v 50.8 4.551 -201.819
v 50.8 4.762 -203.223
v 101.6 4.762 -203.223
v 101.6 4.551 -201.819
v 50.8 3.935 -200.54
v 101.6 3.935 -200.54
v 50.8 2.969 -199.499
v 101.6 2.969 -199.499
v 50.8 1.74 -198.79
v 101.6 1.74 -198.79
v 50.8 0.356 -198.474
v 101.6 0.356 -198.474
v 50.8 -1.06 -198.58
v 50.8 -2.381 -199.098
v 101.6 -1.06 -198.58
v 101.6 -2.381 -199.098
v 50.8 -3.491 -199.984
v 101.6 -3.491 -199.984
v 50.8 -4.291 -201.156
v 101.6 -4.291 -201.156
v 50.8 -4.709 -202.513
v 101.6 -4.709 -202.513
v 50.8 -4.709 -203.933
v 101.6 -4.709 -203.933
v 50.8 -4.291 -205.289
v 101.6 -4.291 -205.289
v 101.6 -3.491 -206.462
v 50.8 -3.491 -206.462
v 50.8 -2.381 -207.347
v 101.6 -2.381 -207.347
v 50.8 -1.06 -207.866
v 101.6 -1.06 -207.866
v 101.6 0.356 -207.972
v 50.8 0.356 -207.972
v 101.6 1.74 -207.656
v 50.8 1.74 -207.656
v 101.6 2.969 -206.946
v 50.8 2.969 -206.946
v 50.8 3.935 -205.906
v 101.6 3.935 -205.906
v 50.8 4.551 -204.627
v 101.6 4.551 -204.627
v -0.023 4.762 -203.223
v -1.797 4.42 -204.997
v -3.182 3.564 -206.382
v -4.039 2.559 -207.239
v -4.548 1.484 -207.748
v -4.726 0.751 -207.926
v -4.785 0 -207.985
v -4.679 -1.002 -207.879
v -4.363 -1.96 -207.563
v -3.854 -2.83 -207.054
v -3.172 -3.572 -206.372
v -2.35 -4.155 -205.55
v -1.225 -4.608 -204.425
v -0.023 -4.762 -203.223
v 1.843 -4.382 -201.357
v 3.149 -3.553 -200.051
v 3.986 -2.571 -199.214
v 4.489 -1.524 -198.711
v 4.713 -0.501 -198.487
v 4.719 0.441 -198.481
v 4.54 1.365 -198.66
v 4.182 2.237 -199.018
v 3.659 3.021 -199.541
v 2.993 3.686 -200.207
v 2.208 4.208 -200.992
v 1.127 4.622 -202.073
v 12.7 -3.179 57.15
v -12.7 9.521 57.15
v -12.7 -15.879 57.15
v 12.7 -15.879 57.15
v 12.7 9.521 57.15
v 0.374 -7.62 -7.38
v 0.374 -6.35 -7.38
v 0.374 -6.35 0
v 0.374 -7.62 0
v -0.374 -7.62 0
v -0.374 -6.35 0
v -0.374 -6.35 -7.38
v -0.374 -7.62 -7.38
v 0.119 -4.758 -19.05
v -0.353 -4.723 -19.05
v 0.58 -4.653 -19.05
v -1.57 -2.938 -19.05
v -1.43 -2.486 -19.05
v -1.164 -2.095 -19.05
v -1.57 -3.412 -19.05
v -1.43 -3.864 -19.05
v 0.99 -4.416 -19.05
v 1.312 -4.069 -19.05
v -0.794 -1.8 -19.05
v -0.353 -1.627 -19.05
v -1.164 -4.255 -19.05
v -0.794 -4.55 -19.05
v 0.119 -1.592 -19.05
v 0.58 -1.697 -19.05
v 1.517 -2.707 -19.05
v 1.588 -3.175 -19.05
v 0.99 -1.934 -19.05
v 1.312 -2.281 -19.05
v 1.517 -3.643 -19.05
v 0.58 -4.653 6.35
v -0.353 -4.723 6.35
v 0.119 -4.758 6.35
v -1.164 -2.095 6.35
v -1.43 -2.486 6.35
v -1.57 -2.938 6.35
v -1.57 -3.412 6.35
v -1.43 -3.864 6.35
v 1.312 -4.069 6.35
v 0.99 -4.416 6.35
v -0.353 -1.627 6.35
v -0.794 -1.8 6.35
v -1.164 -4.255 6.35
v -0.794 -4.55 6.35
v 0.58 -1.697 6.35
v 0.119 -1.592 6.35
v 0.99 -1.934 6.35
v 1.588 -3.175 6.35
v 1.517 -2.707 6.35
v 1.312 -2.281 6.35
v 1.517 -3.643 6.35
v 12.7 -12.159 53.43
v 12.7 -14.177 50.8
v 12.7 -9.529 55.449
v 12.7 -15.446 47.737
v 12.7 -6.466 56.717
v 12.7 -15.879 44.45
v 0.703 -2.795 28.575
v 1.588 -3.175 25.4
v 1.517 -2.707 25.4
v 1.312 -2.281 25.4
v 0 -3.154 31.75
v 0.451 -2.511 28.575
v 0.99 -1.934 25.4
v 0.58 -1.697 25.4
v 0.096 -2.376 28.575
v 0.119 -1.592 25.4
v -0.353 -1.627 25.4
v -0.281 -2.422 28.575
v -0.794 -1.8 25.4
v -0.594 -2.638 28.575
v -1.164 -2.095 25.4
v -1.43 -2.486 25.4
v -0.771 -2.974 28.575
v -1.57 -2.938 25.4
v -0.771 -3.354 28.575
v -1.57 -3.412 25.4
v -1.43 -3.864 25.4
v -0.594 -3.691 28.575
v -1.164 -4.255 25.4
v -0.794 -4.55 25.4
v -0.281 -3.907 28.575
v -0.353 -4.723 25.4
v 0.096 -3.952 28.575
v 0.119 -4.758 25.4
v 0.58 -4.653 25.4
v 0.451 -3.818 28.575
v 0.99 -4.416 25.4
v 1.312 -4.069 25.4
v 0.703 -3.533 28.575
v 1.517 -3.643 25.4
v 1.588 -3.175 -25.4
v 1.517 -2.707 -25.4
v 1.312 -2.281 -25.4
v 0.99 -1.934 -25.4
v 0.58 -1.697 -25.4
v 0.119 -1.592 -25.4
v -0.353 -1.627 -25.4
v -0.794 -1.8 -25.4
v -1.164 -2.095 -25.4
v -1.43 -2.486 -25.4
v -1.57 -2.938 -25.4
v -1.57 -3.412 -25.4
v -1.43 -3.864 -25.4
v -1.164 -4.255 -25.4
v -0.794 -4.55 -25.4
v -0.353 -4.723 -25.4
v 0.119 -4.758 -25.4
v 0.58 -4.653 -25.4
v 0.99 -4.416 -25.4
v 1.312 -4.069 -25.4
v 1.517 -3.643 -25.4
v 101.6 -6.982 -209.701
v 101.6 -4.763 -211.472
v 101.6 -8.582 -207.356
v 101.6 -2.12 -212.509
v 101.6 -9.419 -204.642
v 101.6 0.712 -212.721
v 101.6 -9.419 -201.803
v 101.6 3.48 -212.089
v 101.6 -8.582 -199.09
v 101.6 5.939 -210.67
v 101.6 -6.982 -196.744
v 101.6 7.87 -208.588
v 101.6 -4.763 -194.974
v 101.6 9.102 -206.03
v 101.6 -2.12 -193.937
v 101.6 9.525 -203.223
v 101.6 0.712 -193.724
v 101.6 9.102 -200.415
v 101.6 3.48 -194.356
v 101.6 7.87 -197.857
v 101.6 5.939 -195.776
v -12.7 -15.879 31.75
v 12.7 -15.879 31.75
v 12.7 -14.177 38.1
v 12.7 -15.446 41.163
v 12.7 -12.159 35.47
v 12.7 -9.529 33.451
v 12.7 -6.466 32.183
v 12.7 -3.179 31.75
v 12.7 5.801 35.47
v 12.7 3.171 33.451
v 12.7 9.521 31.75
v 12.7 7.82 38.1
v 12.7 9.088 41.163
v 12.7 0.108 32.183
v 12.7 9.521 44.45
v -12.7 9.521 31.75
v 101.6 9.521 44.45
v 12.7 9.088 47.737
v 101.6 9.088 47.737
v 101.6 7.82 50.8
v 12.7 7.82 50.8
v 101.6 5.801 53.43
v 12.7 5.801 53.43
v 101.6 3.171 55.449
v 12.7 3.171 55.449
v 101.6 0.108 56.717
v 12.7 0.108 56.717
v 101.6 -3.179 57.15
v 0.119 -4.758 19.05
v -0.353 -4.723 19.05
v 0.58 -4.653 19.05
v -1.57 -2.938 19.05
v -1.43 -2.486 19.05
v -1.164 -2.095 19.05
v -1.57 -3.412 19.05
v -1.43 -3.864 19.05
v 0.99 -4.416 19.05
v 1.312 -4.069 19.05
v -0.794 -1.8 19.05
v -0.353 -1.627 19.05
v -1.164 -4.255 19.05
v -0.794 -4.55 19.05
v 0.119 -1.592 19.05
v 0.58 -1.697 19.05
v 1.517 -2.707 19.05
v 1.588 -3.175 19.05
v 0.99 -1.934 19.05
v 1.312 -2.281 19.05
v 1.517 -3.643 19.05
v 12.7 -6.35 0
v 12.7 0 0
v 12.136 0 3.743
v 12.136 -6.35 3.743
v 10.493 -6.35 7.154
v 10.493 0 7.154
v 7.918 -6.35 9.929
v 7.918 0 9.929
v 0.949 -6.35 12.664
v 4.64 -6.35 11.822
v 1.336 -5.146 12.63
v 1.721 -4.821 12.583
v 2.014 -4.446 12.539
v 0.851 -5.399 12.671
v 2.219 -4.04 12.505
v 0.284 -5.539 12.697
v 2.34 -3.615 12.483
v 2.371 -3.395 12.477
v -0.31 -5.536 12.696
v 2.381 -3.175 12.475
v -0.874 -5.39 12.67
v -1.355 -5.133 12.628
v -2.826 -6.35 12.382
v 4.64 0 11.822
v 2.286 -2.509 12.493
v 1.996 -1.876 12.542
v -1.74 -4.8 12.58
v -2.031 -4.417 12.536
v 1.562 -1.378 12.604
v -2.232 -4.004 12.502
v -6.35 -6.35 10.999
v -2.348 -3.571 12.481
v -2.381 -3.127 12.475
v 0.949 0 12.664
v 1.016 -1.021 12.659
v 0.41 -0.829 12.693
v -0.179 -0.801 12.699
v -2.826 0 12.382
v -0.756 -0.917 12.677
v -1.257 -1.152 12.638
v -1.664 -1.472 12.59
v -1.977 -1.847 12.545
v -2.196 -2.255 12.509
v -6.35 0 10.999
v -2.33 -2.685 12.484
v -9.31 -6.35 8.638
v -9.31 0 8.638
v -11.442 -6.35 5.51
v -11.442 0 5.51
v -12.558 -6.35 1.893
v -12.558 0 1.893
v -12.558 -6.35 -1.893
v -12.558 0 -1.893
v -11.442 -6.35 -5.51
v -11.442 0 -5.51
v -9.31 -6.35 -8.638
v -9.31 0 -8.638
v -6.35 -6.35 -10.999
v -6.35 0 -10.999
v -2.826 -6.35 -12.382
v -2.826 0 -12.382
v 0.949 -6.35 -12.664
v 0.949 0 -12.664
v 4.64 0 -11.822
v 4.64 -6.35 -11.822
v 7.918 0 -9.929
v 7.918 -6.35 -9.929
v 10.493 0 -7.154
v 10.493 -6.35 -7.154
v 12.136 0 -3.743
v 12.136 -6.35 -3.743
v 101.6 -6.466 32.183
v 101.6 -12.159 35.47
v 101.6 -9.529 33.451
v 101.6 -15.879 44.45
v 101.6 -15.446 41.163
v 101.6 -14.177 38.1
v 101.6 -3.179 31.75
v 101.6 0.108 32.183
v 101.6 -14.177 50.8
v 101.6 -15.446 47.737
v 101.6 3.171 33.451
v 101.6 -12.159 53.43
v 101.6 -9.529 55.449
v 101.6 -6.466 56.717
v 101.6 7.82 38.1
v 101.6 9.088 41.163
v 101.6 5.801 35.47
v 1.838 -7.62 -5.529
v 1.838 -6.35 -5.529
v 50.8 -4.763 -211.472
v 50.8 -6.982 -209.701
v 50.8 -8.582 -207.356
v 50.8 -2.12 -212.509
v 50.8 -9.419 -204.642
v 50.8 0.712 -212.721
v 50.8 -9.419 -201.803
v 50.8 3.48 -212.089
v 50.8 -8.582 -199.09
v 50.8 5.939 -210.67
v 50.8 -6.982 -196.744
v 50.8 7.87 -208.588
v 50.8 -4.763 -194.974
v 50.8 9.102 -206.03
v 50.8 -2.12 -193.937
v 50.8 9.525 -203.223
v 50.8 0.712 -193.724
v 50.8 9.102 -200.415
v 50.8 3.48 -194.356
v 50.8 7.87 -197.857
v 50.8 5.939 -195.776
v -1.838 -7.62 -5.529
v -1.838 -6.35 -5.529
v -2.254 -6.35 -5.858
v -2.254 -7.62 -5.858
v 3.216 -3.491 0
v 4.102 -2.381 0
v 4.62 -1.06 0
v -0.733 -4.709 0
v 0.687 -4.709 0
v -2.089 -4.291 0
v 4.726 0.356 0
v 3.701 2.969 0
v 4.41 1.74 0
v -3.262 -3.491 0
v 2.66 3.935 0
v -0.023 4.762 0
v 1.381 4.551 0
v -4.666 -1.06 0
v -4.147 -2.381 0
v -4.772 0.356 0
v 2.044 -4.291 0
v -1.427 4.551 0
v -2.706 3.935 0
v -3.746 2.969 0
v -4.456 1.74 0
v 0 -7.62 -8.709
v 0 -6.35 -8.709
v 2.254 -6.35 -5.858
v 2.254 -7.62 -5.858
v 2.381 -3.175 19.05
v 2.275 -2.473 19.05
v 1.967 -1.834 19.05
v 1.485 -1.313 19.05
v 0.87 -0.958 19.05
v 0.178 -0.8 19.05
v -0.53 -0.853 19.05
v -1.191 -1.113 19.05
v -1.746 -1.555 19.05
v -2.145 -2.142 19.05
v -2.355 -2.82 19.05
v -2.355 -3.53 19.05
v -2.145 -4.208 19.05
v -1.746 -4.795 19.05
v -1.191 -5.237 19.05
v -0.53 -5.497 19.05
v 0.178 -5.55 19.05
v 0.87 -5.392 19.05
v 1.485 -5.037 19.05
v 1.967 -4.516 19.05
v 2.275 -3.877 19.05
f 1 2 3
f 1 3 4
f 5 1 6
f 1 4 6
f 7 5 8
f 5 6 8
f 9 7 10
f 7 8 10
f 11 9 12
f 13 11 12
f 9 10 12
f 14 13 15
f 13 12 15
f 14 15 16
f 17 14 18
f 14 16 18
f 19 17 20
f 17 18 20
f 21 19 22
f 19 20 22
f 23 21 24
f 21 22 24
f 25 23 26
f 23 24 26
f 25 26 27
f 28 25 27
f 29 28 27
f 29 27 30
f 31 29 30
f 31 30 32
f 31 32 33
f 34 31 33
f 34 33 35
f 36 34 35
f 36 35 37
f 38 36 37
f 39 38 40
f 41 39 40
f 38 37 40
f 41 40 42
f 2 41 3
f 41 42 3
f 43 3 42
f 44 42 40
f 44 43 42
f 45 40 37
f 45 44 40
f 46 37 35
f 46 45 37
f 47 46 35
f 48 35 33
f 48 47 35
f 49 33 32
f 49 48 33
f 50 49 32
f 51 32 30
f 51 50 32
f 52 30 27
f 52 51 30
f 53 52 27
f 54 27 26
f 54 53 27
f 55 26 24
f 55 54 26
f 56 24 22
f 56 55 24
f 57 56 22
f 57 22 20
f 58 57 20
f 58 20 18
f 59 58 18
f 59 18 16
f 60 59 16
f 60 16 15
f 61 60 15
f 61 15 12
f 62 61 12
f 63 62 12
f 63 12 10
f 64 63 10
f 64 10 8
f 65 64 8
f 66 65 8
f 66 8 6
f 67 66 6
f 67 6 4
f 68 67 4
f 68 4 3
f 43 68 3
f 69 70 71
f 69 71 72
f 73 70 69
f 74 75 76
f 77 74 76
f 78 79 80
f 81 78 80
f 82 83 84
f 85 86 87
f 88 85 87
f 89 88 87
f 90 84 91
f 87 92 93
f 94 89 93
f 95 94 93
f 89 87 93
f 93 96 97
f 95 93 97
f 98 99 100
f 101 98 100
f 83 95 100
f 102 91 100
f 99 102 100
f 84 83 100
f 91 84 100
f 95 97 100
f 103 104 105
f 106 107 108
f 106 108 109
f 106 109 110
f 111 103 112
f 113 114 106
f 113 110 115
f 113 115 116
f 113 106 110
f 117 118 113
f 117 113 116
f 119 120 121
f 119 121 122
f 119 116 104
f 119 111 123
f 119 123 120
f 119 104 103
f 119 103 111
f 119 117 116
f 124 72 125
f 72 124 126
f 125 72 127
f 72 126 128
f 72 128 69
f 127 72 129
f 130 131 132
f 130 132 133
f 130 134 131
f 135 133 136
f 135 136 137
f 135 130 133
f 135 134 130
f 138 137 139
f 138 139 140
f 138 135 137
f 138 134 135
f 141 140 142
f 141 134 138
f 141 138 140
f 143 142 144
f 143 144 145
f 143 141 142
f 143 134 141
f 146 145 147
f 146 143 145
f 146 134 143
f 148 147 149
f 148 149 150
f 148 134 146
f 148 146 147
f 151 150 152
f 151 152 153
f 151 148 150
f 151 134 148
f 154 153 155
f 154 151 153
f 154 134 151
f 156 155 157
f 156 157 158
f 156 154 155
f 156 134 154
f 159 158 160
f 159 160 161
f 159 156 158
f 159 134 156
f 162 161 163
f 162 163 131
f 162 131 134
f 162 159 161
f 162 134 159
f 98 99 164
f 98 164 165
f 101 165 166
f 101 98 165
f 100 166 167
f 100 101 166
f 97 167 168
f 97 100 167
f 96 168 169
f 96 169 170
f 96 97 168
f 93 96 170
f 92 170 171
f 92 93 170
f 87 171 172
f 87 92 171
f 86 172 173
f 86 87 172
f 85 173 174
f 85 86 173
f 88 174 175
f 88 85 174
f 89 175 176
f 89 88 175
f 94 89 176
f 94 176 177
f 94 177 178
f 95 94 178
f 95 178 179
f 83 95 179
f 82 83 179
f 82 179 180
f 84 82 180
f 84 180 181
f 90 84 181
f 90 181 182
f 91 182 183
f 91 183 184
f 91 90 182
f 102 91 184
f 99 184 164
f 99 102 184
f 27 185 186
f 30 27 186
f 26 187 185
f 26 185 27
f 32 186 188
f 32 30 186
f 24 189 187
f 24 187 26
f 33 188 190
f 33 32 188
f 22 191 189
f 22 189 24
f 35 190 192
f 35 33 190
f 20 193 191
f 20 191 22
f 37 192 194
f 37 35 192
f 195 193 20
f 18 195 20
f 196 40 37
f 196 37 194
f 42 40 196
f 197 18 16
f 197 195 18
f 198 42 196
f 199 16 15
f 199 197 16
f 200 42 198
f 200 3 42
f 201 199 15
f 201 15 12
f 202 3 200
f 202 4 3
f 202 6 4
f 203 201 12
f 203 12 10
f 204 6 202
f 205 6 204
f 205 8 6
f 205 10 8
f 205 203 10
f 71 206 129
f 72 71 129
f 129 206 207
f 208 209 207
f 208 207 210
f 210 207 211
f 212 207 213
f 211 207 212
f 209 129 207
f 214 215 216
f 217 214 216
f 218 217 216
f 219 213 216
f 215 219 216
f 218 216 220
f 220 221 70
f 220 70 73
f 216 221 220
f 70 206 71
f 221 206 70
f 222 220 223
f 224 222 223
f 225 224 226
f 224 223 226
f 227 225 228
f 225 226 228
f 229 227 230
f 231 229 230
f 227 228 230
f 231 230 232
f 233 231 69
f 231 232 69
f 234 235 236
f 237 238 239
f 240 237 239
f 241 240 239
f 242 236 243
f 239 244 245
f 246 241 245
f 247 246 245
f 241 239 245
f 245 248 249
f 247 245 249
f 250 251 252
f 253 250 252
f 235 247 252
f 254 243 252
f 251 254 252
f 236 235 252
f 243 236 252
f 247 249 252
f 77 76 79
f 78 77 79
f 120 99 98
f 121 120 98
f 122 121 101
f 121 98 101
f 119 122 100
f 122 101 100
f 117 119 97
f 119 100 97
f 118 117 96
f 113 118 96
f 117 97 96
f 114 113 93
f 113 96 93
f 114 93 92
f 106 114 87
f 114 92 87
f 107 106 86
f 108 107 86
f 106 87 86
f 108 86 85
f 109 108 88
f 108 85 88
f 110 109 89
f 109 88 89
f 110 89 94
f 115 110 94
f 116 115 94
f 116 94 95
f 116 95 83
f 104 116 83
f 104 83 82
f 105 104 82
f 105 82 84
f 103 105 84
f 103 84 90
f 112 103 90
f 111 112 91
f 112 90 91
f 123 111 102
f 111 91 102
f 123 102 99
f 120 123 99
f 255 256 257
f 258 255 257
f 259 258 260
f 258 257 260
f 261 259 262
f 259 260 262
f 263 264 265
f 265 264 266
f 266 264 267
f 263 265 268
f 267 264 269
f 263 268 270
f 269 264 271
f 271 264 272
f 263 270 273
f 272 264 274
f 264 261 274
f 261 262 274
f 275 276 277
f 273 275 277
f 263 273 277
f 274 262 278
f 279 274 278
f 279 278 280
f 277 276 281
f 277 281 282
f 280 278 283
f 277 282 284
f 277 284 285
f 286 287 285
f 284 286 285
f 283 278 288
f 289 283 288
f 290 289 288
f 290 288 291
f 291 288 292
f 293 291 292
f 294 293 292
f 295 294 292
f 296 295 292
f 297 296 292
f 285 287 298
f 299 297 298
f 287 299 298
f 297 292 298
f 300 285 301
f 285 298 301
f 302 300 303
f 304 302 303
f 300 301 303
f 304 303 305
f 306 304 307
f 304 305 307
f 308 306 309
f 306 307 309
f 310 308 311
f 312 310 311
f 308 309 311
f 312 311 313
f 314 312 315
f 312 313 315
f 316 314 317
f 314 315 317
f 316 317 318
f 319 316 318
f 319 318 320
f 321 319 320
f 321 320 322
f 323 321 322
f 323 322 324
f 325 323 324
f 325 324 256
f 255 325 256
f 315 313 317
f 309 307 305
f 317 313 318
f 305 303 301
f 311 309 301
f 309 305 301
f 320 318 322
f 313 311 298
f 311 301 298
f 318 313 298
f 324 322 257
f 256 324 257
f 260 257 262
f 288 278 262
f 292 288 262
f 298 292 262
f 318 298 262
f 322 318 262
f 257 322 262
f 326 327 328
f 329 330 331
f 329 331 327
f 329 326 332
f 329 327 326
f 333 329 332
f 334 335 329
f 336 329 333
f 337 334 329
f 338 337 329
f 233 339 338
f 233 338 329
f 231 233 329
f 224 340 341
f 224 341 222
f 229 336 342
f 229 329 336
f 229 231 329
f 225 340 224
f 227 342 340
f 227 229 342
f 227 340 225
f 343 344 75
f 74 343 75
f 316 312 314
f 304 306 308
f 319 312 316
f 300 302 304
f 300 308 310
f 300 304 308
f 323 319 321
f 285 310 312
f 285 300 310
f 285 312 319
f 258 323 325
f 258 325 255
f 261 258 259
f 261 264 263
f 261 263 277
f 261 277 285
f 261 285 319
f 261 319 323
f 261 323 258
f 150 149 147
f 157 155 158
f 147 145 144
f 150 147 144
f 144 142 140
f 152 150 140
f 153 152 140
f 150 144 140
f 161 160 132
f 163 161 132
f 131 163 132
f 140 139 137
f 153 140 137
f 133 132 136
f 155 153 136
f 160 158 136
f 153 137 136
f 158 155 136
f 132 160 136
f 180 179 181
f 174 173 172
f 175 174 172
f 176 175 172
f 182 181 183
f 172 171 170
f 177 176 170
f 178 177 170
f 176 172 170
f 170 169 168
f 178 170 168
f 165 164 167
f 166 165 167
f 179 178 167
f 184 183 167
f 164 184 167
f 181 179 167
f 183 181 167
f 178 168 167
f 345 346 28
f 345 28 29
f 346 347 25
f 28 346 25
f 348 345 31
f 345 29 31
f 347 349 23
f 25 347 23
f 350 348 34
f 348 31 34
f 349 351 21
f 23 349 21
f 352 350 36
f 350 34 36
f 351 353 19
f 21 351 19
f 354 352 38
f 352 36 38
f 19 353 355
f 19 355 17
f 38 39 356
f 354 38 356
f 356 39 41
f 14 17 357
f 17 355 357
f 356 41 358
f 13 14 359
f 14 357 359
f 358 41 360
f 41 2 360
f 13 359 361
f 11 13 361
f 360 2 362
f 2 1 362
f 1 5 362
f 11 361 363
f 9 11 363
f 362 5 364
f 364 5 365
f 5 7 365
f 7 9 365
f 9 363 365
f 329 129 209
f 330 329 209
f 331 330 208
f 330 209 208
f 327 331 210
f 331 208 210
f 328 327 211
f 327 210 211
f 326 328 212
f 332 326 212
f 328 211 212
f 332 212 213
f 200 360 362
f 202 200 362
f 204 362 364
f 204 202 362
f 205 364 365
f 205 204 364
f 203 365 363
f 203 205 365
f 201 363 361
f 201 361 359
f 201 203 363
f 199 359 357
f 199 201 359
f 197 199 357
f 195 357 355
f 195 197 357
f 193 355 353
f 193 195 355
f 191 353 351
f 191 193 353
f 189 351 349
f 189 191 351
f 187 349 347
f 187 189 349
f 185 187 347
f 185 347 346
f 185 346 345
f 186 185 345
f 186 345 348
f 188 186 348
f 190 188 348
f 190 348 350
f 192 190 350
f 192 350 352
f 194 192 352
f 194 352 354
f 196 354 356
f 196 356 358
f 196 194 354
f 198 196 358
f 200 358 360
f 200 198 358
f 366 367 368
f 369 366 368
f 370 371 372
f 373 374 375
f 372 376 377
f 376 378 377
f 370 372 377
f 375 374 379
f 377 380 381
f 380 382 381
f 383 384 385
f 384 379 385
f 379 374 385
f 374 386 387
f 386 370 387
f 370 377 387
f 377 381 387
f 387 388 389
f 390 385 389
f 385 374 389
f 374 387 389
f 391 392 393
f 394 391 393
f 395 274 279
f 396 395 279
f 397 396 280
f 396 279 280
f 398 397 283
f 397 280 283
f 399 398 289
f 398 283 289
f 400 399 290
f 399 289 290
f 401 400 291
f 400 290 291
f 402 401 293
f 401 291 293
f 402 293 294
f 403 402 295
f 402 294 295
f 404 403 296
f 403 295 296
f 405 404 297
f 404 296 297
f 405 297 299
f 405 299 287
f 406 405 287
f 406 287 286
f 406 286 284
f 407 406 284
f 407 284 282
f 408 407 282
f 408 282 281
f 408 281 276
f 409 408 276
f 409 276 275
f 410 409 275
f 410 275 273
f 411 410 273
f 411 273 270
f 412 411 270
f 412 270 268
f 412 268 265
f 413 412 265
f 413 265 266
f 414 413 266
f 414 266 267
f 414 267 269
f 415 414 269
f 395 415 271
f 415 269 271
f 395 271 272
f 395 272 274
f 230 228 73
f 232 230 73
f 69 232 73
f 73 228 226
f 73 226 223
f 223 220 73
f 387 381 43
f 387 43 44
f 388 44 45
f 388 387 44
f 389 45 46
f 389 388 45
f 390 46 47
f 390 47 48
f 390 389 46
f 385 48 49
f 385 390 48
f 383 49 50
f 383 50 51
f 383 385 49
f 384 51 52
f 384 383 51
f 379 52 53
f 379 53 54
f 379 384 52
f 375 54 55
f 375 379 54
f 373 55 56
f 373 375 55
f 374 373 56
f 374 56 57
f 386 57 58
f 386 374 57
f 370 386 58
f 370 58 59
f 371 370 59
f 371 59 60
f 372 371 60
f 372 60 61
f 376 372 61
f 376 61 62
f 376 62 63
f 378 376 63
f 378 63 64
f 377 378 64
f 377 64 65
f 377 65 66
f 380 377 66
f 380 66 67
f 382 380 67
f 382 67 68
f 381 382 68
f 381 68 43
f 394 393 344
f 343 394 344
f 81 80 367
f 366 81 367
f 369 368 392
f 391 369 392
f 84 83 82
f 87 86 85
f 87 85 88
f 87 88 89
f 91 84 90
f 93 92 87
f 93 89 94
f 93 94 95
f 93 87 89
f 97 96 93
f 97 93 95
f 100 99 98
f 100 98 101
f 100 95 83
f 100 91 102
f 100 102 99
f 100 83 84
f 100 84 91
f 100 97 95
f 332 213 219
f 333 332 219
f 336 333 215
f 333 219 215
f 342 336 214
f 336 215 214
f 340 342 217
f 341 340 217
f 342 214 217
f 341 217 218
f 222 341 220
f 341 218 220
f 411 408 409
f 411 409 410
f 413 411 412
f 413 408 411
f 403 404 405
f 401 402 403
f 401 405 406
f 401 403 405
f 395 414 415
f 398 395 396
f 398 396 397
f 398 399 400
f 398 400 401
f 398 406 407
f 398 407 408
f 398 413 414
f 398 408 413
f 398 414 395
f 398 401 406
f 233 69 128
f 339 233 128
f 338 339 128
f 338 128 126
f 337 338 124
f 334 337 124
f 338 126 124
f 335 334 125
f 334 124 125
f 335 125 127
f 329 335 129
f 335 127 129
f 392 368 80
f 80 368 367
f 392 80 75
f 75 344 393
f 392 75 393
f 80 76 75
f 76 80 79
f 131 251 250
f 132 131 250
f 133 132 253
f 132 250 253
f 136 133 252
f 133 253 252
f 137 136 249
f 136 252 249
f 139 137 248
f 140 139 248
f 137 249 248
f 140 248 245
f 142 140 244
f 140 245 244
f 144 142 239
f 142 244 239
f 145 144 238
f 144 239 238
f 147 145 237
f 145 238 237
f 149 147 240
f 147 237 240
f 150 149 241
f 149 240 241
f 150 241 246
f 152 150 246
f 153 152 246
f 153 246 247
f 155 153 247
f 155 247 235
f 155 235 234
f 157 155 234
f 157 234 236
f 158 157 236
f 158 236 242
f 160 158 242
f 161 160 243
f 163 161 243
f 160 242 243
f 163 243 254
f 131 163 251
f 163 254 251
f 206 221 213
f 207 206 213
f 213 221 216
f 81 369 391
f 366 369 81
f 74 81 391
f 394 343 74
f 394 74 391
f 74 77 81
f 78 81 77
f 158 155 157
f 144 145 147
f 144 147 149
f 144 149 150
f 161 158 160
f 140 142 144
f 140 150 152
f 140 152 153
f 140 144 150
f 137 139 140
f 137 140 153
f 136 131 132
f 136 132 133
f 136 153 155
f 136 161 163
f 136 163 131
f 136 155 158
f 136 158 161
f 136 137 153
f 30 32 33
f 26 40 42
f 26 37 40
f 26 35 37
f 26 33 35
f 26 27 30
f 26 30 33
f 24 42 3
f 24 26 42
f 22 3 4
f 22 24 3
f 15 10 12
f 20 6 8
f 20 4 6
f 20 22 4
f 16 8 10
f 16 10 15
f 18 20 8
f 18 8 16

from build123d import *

# Parameters (mm, degrees)
F0_R      = 12.7
F1_DEPTH  = 6.35
F2_R      = 2.38125
F3_DEPTH  = 19.05
F4_R      = 1.5875
F5_DEPTH  = 6.35
F5_FACE_R = 1.5875
F10_DEPTH = 25.4
F12_DEPTH = 1.27
F15_R     = 4.7625
F17_R     = 9.525
F17_R_2   = 4.7625
F18_DEPTH = 50.8
F19_W     = 25.4
F19_H     = 25.4
F20_DEPTH = 25.4
F22_DEPTH = 88.9


with BuildPart() as f1:
    # F0 (on Front) → F1 (new body)
    with BuildSketch(Plane.XZ):
        Circle(F0_R)
    extrude(amount=F1_DEPTH)

    # F2 (on Top) → F3 (join)
    with BuildSketch(Plane.XY):
        with Locations((0, -3.175)):
            Circle(F2_R)
    extrude(amount=F3_DEPTH)


with BuildPart() as f5:
    # F4 (on face) → F5 (new body)
    with BuildSketch(Plane.XY.offset(19.05)):
        with Locations((0, -3.175)):
            Circle(F4_R)
    extrude(amount=F5_DEPTH)


with BuildPart() as f8:
    # F5_face (on face) → F8 section 0
    with BuildSketch(Plane(origin=(0, -3.175, 25.4), x_dir=(1, 0, 0), z_dir=(0, 0, 1)), mode=Mode.PRIVATE) as f8_s0:
        Circle(F5_FACE_R)
    loft([f8_s0.sketch, Vertex(0, -3.1537474133, 31.75)])


with BuildPart() as f9_1:
    # F9: instance of F5
    add(f5.part.mirror(Plane.XY))


with BuildPart() as f10:
    # F10 (new): a face of the model
    f10_faces = [f9_1.part.faces().sort_by_distance(p)[0] for p in [
        (0, -3.175, -19.05),
    ]]
    extrude(f10_faces, amount=F10_DEPTH)


with BuildPart() as f12:
    # F11 (on face) → F12 (new body)
    with BuildSketch(Plane.XZ.offset(6.35)):
        Polygon((-2.2543081655, -5.8581982868), (0, -8.7085170671), (2.2543081655, -5.8581982868), (1.8381207473, -5.5290369658), (0.3738755768, -7.3804100712), (0.3738755768, 0), (-0.3738755768, 0), (-0.3738755768, -7.3804100712), (-1.8381207473, -5.5290369658), align=None)
    extrude(amount=F12_DEPTH)


with BuildPart() as f16:
    # F16: sweep along a path in F13
    with BuildLine(Plane.XZ) as f16_path:
        Line((101.6, -203.2), (0, -203.2))
        Line((0, -203.2), (0, 0))
    # F15 (on line) → F16 (sweep)
    with BuildSketch(Plane.YZ.offset(101.6)):
        with Locations((0, -203.2228261232)):
            Circle(F15_R)
    sweep(path=f16_path.line, transition=Transition.RIGHT)


with BuildPart() as f18:
    # F17 (on face) → F18 (new body)
    with BuildSketch(Plane.YZ.offset(101.6)):
        with Locations((0, -203.2228261232)):
            Circle(F17_R)
        with Locations((0, -203.2228261232)):
            Circle(F17_R_2, mode=Mode.SUBTRACT)
    extrude(amount=-F18_DEPTH)


with BuildPart() as f20:
    # F19 (on offset) → F20 (new body)
    with BuildSketch(Plane.XY.offset(31.75)):
        with Locations((0, -3.1788726337)):
            Rectangle(F19_W, F19_H)
    extrude(amount=F20_DEPTH)

    # F21 (on face) → F22 (join)
    with BuildSketch(Plane.YZ.offset(12.7)):
        with BuildLine():
            ThreePointArc((-3.1788726337, 31.75), (5.8013834873, 35.4697438789), (9.5211273663, 44.45))
            ThreePointArc((9.5211273663, 44.45), (5.8013834873, 53.4302561211), (-3.1788726337, 57.15))
            ThreePointArc((-3.1788726337, 57.15), (-12.1591287548, 53.4302561211), (-15.8788726337, 44.45))
            ThreePointArc((-15.8788726337, 44.45), (-12.1591287548, 35.4697438789), (-3.1788726337, 31.75))
        make_face()
    extrude(amount=F22_DEPTH)


solid = Compound([f1.part, f5.part, f8.part, f9_1.part, f10.part, f12.part, f16.part, f18.part, f20.part])
